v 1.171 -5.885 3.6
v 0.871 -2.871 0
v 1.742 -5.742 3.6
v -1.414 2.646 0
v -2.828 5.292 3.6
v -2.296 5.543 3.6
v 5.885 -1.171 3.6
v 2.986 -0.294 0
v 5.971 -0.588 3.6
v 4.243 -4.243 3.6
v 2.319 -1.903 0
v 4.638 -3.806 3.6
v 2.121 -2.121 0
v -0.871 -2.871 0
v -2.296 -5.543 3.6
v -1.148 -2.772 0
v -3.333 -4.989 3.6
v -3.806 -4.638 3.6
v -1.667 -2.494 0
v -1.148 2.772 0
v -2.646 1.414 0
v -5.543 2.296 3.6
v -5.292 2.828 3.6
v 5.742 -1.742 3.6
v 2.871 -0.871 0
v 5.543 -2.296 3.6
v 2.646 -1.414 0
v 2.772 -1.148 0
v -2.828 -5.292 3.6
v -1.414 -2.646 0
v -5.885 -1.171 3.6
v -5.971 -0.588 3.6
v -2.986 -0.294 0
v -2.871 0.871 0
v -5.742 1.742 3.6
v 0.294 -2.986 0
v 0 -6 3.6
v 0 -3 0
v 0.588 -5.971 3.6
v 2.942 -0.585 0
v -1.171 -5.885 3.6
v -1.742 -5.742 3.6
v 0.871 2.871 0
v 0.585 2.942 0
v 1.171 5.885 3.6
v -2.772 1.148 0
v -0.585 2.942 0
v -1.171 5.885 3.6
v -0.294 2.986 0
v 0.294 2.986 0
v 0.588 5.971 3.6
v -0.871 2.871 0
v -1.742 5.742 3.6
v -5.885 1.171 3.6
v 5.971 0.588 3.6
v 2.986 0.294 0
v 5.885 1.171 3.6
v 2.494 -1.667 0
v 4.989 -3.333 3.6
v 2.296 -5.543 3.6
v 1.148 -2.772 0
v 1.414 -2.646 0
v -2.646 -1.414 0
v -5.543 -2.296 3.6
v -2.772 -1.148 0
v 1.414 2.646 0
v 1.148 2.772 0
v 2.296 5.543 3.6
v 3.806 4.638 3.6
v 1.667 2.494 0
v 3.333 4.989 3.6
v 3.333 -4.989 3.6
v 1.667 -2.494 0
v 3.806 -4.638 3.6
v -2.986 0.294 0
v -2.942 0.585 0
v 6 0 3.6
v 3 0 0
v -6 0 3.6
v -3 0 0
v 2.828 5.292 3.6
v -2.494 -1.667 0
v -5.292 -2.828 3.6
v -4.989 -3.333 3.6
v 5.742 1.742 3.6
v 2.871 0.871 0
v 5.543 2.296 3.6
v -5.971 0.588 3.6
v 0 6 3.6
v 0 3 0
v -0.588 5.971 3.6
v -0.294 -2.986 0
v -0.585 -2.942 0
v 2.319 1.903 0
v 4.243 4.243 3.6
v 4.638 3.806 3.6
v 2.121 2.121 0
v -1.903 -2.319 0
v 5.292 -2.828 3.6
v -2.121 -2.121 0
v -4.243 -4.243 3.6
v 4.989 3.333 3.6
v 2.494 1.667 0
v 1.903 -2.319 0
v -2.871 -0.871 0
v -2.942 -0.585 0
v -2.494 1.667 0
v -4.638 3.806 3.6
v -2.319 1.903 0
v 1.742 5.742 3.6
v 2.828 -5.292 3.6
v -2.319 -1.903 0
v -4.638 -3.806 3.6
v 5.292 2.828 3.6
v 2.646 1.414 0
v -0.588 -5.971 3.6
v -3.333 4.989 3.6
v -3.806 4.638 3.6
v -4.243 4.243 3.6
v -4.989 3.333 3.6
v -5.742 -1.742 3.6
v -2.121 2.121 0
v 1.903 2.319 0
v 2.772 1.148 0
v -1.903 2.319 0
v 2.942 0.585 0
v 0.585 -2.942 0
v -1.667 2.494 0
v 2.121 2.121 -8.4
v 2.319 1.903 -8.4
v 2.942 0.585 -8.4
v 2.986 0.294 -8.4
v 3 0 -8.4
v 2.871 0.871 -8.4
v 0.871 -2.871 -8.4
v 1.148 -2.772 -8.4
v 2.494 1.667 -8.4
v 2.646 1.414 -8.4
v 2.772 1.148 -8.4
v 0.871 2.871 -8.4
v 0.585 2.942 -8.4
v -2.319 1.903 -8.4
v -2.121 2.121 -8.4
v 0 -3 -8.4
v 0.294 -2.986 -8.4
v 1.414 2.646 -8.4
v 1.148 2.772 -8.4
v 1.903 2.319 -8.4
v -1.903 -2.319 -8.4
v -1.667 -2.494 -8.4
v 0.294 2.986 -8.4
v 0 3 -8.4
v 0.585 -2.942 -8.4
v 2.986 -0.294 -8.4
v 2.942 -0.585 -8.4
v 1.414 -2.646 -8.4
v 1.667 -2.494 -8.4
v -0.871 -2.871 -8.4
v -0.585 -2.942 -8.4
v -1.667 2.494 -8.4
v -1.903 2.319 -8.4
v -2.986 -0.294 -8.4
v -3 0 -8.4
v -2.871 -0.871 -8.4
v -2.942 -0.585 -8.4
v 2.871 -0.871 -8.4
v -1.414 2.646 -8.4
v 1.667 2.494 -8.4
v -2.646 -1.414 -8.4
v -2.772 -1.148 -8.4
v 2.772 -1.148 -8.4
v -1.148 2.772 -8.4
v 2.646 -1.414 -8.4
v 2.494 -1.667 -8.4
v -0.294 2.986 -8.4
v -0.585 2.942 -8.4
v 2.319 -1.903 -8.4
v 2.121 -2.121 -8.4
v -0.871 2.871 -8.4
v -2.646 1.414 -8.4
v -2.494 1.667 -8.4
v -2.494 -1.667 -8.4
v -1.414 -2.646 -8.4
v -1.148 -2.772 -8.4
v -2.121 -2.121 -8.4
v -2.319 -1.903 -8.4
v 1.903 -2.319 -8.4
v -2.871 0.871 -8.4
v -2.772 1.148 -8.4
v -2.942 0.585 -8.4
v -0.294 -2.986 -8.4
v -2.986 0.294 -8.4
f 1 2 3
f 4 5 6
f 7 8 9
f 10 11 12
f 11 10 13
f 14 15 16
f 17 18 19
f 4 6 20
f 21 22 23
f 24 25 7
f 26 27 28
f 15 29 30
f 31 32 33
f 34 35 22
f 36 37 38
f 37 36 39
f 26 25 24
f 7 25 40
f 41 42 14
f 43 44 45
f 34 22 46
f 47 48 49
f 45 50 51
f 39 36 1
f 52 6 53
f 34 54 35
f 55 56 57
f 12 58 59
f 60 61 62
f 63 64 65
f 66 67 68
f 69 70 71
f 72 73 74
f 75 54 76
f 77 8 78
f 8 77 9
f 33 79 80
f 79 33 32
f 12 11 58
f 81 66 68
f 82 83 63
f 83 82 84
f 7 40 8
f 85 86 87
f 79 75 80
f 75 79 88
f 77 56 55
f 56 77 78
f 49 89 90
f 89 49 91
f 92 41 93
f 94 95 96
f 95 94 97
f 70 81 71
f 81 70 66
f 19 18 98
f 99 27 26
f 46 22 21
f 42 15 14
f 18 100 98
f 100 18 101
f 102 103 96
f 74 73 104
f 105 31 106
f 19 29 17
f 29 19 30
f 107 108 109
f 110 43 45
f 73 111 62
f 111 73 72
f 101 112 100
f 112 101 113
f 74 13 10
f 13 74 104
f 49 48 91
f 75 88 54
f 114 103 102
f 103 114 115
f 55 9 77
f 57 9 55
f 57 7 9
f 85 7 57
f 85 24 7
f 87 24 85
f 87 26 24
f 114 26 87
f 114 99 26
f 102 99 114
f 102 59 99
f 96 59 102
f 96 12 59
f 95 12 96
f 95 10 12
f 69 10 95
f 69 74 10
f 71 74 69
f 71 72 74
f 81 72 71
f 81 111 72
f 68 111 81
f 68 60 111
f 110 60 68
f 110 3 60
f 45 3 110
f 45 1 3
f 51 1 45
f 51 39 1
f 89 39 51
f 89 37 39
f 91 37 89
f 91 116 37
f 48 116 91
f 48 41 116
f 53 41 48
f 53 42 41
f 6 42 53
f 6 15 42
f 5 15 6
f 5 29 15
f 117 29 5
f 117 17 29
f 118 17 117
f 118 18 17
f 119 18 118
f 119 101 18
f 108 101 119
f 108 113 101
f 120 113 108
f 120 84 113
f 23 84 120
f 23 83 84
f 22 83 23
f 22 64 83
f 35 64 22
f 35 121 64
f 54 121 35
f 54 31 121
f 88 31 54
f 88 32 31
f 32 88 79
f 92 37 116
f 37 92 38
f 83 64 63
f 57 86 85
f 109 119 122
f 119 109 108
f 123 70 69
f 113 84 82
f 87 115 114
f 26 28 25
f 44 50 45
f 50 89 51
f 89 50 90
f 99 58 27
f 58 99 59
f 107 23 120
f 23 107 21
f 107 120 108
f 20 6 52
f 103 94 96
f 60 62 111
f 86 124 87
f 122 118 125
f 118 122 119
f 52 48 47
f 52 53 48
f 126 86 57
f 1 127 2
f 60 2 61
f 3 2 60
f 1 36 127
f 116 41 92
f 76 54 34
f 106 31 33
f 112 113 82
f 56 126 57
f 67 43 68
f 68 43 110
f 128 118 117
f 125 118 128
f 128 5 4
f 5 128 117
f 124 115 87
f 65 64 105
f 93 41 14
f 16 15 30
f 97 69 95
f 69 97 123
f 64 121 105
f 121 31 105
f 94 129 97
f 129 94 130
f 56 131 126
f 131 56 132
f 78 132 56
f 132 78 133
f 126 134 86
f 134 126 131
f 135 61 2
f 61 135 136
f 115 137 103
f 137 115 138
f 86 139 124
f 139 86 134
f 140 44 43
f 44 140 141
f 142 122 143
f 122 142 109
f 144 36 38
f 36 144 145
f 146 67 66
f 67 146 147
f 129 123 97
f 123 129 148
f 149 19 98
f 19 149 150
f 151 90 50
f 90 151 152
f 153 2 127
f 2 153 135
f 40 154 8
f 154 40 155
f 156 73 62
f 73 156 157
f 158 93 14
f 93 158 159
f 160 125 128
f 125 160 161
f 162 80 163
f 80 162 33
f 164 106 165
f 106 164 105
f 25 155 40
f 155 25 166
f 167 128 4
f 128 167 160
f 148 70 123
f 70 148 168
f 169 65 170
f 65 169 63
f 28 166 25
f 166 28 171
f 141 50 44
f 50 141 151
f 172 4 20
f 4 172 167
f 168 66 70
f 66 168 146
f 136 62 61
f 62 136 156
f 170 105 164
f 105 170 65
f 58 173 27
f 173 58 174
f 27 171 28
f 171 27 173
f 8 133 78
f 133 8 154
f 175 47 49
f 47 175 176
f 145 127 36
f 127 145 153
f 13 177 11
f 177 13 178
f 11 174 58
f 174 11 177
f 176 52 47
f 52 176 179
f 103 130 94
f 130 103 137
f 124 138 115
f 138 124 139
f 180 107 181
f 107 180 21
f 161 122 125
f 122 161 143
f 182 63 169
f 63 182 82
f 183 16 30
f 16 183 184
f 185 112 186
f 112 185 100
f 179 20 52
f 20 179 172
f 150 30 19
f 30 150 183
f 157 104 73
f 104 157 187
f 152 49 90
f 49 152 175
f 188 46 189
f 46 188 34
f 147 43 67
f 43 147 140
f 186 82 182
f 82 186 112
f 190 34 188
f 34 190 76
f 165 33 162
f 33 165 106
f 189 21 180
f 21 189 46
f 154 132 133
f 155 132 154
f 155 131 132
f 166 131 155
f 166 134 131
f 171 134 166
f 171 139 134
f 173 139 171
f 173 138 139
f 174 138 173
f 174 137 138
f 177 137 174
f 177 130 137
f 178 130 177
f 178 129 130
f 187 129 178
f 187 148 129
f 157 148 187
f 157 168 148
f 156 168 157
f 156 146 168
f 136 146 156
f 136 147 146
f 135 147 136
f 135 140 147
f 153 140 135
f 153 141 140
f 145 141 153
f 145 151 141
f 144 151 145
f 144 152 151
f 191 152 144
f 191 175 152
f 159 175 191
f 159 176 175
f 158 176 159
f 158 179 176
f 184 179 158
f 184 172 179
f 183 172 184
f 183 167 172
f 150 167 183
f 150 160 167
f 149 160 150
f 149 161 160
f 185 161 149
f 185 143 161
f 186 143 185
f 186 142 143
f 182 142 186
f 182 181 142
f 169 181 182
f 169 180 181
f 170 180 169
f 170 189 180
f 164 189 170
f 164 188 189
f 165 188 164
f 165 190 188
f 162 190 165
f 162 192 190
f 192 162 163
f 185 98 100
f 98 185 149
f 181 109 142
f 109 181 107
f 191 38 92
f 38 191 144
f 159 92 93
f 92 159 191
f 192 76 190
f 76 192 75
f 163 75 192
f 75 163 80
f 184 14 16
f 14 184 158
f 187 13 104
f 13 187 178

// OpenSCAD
// M6 countersunk (flat head) screw — ISO 10642 / DIN 7991
// Length is measured from top of head to tip (standard for countersunk)

screw_length = 12;   // total length head-top to tip
dk = 12.0;           // head diameter
k  = 3.6;            // head height (conical, 90°)
d  = 6.0;            // shaft diameter

$fn = 64;

module screw_m6_csk(length = screw_length) {
    shaft_len = length - k;
    union() {
        // Countersunk head: cone from dk at top to d at bottom
        cylinder(h = k, d1 = d, d2 = dk);
        // Shaft going downward
        translate([0, 0, -shaft_len])
            cylinder(h = shaft_len, d = d);
    }
}

screw_m6_csk();
